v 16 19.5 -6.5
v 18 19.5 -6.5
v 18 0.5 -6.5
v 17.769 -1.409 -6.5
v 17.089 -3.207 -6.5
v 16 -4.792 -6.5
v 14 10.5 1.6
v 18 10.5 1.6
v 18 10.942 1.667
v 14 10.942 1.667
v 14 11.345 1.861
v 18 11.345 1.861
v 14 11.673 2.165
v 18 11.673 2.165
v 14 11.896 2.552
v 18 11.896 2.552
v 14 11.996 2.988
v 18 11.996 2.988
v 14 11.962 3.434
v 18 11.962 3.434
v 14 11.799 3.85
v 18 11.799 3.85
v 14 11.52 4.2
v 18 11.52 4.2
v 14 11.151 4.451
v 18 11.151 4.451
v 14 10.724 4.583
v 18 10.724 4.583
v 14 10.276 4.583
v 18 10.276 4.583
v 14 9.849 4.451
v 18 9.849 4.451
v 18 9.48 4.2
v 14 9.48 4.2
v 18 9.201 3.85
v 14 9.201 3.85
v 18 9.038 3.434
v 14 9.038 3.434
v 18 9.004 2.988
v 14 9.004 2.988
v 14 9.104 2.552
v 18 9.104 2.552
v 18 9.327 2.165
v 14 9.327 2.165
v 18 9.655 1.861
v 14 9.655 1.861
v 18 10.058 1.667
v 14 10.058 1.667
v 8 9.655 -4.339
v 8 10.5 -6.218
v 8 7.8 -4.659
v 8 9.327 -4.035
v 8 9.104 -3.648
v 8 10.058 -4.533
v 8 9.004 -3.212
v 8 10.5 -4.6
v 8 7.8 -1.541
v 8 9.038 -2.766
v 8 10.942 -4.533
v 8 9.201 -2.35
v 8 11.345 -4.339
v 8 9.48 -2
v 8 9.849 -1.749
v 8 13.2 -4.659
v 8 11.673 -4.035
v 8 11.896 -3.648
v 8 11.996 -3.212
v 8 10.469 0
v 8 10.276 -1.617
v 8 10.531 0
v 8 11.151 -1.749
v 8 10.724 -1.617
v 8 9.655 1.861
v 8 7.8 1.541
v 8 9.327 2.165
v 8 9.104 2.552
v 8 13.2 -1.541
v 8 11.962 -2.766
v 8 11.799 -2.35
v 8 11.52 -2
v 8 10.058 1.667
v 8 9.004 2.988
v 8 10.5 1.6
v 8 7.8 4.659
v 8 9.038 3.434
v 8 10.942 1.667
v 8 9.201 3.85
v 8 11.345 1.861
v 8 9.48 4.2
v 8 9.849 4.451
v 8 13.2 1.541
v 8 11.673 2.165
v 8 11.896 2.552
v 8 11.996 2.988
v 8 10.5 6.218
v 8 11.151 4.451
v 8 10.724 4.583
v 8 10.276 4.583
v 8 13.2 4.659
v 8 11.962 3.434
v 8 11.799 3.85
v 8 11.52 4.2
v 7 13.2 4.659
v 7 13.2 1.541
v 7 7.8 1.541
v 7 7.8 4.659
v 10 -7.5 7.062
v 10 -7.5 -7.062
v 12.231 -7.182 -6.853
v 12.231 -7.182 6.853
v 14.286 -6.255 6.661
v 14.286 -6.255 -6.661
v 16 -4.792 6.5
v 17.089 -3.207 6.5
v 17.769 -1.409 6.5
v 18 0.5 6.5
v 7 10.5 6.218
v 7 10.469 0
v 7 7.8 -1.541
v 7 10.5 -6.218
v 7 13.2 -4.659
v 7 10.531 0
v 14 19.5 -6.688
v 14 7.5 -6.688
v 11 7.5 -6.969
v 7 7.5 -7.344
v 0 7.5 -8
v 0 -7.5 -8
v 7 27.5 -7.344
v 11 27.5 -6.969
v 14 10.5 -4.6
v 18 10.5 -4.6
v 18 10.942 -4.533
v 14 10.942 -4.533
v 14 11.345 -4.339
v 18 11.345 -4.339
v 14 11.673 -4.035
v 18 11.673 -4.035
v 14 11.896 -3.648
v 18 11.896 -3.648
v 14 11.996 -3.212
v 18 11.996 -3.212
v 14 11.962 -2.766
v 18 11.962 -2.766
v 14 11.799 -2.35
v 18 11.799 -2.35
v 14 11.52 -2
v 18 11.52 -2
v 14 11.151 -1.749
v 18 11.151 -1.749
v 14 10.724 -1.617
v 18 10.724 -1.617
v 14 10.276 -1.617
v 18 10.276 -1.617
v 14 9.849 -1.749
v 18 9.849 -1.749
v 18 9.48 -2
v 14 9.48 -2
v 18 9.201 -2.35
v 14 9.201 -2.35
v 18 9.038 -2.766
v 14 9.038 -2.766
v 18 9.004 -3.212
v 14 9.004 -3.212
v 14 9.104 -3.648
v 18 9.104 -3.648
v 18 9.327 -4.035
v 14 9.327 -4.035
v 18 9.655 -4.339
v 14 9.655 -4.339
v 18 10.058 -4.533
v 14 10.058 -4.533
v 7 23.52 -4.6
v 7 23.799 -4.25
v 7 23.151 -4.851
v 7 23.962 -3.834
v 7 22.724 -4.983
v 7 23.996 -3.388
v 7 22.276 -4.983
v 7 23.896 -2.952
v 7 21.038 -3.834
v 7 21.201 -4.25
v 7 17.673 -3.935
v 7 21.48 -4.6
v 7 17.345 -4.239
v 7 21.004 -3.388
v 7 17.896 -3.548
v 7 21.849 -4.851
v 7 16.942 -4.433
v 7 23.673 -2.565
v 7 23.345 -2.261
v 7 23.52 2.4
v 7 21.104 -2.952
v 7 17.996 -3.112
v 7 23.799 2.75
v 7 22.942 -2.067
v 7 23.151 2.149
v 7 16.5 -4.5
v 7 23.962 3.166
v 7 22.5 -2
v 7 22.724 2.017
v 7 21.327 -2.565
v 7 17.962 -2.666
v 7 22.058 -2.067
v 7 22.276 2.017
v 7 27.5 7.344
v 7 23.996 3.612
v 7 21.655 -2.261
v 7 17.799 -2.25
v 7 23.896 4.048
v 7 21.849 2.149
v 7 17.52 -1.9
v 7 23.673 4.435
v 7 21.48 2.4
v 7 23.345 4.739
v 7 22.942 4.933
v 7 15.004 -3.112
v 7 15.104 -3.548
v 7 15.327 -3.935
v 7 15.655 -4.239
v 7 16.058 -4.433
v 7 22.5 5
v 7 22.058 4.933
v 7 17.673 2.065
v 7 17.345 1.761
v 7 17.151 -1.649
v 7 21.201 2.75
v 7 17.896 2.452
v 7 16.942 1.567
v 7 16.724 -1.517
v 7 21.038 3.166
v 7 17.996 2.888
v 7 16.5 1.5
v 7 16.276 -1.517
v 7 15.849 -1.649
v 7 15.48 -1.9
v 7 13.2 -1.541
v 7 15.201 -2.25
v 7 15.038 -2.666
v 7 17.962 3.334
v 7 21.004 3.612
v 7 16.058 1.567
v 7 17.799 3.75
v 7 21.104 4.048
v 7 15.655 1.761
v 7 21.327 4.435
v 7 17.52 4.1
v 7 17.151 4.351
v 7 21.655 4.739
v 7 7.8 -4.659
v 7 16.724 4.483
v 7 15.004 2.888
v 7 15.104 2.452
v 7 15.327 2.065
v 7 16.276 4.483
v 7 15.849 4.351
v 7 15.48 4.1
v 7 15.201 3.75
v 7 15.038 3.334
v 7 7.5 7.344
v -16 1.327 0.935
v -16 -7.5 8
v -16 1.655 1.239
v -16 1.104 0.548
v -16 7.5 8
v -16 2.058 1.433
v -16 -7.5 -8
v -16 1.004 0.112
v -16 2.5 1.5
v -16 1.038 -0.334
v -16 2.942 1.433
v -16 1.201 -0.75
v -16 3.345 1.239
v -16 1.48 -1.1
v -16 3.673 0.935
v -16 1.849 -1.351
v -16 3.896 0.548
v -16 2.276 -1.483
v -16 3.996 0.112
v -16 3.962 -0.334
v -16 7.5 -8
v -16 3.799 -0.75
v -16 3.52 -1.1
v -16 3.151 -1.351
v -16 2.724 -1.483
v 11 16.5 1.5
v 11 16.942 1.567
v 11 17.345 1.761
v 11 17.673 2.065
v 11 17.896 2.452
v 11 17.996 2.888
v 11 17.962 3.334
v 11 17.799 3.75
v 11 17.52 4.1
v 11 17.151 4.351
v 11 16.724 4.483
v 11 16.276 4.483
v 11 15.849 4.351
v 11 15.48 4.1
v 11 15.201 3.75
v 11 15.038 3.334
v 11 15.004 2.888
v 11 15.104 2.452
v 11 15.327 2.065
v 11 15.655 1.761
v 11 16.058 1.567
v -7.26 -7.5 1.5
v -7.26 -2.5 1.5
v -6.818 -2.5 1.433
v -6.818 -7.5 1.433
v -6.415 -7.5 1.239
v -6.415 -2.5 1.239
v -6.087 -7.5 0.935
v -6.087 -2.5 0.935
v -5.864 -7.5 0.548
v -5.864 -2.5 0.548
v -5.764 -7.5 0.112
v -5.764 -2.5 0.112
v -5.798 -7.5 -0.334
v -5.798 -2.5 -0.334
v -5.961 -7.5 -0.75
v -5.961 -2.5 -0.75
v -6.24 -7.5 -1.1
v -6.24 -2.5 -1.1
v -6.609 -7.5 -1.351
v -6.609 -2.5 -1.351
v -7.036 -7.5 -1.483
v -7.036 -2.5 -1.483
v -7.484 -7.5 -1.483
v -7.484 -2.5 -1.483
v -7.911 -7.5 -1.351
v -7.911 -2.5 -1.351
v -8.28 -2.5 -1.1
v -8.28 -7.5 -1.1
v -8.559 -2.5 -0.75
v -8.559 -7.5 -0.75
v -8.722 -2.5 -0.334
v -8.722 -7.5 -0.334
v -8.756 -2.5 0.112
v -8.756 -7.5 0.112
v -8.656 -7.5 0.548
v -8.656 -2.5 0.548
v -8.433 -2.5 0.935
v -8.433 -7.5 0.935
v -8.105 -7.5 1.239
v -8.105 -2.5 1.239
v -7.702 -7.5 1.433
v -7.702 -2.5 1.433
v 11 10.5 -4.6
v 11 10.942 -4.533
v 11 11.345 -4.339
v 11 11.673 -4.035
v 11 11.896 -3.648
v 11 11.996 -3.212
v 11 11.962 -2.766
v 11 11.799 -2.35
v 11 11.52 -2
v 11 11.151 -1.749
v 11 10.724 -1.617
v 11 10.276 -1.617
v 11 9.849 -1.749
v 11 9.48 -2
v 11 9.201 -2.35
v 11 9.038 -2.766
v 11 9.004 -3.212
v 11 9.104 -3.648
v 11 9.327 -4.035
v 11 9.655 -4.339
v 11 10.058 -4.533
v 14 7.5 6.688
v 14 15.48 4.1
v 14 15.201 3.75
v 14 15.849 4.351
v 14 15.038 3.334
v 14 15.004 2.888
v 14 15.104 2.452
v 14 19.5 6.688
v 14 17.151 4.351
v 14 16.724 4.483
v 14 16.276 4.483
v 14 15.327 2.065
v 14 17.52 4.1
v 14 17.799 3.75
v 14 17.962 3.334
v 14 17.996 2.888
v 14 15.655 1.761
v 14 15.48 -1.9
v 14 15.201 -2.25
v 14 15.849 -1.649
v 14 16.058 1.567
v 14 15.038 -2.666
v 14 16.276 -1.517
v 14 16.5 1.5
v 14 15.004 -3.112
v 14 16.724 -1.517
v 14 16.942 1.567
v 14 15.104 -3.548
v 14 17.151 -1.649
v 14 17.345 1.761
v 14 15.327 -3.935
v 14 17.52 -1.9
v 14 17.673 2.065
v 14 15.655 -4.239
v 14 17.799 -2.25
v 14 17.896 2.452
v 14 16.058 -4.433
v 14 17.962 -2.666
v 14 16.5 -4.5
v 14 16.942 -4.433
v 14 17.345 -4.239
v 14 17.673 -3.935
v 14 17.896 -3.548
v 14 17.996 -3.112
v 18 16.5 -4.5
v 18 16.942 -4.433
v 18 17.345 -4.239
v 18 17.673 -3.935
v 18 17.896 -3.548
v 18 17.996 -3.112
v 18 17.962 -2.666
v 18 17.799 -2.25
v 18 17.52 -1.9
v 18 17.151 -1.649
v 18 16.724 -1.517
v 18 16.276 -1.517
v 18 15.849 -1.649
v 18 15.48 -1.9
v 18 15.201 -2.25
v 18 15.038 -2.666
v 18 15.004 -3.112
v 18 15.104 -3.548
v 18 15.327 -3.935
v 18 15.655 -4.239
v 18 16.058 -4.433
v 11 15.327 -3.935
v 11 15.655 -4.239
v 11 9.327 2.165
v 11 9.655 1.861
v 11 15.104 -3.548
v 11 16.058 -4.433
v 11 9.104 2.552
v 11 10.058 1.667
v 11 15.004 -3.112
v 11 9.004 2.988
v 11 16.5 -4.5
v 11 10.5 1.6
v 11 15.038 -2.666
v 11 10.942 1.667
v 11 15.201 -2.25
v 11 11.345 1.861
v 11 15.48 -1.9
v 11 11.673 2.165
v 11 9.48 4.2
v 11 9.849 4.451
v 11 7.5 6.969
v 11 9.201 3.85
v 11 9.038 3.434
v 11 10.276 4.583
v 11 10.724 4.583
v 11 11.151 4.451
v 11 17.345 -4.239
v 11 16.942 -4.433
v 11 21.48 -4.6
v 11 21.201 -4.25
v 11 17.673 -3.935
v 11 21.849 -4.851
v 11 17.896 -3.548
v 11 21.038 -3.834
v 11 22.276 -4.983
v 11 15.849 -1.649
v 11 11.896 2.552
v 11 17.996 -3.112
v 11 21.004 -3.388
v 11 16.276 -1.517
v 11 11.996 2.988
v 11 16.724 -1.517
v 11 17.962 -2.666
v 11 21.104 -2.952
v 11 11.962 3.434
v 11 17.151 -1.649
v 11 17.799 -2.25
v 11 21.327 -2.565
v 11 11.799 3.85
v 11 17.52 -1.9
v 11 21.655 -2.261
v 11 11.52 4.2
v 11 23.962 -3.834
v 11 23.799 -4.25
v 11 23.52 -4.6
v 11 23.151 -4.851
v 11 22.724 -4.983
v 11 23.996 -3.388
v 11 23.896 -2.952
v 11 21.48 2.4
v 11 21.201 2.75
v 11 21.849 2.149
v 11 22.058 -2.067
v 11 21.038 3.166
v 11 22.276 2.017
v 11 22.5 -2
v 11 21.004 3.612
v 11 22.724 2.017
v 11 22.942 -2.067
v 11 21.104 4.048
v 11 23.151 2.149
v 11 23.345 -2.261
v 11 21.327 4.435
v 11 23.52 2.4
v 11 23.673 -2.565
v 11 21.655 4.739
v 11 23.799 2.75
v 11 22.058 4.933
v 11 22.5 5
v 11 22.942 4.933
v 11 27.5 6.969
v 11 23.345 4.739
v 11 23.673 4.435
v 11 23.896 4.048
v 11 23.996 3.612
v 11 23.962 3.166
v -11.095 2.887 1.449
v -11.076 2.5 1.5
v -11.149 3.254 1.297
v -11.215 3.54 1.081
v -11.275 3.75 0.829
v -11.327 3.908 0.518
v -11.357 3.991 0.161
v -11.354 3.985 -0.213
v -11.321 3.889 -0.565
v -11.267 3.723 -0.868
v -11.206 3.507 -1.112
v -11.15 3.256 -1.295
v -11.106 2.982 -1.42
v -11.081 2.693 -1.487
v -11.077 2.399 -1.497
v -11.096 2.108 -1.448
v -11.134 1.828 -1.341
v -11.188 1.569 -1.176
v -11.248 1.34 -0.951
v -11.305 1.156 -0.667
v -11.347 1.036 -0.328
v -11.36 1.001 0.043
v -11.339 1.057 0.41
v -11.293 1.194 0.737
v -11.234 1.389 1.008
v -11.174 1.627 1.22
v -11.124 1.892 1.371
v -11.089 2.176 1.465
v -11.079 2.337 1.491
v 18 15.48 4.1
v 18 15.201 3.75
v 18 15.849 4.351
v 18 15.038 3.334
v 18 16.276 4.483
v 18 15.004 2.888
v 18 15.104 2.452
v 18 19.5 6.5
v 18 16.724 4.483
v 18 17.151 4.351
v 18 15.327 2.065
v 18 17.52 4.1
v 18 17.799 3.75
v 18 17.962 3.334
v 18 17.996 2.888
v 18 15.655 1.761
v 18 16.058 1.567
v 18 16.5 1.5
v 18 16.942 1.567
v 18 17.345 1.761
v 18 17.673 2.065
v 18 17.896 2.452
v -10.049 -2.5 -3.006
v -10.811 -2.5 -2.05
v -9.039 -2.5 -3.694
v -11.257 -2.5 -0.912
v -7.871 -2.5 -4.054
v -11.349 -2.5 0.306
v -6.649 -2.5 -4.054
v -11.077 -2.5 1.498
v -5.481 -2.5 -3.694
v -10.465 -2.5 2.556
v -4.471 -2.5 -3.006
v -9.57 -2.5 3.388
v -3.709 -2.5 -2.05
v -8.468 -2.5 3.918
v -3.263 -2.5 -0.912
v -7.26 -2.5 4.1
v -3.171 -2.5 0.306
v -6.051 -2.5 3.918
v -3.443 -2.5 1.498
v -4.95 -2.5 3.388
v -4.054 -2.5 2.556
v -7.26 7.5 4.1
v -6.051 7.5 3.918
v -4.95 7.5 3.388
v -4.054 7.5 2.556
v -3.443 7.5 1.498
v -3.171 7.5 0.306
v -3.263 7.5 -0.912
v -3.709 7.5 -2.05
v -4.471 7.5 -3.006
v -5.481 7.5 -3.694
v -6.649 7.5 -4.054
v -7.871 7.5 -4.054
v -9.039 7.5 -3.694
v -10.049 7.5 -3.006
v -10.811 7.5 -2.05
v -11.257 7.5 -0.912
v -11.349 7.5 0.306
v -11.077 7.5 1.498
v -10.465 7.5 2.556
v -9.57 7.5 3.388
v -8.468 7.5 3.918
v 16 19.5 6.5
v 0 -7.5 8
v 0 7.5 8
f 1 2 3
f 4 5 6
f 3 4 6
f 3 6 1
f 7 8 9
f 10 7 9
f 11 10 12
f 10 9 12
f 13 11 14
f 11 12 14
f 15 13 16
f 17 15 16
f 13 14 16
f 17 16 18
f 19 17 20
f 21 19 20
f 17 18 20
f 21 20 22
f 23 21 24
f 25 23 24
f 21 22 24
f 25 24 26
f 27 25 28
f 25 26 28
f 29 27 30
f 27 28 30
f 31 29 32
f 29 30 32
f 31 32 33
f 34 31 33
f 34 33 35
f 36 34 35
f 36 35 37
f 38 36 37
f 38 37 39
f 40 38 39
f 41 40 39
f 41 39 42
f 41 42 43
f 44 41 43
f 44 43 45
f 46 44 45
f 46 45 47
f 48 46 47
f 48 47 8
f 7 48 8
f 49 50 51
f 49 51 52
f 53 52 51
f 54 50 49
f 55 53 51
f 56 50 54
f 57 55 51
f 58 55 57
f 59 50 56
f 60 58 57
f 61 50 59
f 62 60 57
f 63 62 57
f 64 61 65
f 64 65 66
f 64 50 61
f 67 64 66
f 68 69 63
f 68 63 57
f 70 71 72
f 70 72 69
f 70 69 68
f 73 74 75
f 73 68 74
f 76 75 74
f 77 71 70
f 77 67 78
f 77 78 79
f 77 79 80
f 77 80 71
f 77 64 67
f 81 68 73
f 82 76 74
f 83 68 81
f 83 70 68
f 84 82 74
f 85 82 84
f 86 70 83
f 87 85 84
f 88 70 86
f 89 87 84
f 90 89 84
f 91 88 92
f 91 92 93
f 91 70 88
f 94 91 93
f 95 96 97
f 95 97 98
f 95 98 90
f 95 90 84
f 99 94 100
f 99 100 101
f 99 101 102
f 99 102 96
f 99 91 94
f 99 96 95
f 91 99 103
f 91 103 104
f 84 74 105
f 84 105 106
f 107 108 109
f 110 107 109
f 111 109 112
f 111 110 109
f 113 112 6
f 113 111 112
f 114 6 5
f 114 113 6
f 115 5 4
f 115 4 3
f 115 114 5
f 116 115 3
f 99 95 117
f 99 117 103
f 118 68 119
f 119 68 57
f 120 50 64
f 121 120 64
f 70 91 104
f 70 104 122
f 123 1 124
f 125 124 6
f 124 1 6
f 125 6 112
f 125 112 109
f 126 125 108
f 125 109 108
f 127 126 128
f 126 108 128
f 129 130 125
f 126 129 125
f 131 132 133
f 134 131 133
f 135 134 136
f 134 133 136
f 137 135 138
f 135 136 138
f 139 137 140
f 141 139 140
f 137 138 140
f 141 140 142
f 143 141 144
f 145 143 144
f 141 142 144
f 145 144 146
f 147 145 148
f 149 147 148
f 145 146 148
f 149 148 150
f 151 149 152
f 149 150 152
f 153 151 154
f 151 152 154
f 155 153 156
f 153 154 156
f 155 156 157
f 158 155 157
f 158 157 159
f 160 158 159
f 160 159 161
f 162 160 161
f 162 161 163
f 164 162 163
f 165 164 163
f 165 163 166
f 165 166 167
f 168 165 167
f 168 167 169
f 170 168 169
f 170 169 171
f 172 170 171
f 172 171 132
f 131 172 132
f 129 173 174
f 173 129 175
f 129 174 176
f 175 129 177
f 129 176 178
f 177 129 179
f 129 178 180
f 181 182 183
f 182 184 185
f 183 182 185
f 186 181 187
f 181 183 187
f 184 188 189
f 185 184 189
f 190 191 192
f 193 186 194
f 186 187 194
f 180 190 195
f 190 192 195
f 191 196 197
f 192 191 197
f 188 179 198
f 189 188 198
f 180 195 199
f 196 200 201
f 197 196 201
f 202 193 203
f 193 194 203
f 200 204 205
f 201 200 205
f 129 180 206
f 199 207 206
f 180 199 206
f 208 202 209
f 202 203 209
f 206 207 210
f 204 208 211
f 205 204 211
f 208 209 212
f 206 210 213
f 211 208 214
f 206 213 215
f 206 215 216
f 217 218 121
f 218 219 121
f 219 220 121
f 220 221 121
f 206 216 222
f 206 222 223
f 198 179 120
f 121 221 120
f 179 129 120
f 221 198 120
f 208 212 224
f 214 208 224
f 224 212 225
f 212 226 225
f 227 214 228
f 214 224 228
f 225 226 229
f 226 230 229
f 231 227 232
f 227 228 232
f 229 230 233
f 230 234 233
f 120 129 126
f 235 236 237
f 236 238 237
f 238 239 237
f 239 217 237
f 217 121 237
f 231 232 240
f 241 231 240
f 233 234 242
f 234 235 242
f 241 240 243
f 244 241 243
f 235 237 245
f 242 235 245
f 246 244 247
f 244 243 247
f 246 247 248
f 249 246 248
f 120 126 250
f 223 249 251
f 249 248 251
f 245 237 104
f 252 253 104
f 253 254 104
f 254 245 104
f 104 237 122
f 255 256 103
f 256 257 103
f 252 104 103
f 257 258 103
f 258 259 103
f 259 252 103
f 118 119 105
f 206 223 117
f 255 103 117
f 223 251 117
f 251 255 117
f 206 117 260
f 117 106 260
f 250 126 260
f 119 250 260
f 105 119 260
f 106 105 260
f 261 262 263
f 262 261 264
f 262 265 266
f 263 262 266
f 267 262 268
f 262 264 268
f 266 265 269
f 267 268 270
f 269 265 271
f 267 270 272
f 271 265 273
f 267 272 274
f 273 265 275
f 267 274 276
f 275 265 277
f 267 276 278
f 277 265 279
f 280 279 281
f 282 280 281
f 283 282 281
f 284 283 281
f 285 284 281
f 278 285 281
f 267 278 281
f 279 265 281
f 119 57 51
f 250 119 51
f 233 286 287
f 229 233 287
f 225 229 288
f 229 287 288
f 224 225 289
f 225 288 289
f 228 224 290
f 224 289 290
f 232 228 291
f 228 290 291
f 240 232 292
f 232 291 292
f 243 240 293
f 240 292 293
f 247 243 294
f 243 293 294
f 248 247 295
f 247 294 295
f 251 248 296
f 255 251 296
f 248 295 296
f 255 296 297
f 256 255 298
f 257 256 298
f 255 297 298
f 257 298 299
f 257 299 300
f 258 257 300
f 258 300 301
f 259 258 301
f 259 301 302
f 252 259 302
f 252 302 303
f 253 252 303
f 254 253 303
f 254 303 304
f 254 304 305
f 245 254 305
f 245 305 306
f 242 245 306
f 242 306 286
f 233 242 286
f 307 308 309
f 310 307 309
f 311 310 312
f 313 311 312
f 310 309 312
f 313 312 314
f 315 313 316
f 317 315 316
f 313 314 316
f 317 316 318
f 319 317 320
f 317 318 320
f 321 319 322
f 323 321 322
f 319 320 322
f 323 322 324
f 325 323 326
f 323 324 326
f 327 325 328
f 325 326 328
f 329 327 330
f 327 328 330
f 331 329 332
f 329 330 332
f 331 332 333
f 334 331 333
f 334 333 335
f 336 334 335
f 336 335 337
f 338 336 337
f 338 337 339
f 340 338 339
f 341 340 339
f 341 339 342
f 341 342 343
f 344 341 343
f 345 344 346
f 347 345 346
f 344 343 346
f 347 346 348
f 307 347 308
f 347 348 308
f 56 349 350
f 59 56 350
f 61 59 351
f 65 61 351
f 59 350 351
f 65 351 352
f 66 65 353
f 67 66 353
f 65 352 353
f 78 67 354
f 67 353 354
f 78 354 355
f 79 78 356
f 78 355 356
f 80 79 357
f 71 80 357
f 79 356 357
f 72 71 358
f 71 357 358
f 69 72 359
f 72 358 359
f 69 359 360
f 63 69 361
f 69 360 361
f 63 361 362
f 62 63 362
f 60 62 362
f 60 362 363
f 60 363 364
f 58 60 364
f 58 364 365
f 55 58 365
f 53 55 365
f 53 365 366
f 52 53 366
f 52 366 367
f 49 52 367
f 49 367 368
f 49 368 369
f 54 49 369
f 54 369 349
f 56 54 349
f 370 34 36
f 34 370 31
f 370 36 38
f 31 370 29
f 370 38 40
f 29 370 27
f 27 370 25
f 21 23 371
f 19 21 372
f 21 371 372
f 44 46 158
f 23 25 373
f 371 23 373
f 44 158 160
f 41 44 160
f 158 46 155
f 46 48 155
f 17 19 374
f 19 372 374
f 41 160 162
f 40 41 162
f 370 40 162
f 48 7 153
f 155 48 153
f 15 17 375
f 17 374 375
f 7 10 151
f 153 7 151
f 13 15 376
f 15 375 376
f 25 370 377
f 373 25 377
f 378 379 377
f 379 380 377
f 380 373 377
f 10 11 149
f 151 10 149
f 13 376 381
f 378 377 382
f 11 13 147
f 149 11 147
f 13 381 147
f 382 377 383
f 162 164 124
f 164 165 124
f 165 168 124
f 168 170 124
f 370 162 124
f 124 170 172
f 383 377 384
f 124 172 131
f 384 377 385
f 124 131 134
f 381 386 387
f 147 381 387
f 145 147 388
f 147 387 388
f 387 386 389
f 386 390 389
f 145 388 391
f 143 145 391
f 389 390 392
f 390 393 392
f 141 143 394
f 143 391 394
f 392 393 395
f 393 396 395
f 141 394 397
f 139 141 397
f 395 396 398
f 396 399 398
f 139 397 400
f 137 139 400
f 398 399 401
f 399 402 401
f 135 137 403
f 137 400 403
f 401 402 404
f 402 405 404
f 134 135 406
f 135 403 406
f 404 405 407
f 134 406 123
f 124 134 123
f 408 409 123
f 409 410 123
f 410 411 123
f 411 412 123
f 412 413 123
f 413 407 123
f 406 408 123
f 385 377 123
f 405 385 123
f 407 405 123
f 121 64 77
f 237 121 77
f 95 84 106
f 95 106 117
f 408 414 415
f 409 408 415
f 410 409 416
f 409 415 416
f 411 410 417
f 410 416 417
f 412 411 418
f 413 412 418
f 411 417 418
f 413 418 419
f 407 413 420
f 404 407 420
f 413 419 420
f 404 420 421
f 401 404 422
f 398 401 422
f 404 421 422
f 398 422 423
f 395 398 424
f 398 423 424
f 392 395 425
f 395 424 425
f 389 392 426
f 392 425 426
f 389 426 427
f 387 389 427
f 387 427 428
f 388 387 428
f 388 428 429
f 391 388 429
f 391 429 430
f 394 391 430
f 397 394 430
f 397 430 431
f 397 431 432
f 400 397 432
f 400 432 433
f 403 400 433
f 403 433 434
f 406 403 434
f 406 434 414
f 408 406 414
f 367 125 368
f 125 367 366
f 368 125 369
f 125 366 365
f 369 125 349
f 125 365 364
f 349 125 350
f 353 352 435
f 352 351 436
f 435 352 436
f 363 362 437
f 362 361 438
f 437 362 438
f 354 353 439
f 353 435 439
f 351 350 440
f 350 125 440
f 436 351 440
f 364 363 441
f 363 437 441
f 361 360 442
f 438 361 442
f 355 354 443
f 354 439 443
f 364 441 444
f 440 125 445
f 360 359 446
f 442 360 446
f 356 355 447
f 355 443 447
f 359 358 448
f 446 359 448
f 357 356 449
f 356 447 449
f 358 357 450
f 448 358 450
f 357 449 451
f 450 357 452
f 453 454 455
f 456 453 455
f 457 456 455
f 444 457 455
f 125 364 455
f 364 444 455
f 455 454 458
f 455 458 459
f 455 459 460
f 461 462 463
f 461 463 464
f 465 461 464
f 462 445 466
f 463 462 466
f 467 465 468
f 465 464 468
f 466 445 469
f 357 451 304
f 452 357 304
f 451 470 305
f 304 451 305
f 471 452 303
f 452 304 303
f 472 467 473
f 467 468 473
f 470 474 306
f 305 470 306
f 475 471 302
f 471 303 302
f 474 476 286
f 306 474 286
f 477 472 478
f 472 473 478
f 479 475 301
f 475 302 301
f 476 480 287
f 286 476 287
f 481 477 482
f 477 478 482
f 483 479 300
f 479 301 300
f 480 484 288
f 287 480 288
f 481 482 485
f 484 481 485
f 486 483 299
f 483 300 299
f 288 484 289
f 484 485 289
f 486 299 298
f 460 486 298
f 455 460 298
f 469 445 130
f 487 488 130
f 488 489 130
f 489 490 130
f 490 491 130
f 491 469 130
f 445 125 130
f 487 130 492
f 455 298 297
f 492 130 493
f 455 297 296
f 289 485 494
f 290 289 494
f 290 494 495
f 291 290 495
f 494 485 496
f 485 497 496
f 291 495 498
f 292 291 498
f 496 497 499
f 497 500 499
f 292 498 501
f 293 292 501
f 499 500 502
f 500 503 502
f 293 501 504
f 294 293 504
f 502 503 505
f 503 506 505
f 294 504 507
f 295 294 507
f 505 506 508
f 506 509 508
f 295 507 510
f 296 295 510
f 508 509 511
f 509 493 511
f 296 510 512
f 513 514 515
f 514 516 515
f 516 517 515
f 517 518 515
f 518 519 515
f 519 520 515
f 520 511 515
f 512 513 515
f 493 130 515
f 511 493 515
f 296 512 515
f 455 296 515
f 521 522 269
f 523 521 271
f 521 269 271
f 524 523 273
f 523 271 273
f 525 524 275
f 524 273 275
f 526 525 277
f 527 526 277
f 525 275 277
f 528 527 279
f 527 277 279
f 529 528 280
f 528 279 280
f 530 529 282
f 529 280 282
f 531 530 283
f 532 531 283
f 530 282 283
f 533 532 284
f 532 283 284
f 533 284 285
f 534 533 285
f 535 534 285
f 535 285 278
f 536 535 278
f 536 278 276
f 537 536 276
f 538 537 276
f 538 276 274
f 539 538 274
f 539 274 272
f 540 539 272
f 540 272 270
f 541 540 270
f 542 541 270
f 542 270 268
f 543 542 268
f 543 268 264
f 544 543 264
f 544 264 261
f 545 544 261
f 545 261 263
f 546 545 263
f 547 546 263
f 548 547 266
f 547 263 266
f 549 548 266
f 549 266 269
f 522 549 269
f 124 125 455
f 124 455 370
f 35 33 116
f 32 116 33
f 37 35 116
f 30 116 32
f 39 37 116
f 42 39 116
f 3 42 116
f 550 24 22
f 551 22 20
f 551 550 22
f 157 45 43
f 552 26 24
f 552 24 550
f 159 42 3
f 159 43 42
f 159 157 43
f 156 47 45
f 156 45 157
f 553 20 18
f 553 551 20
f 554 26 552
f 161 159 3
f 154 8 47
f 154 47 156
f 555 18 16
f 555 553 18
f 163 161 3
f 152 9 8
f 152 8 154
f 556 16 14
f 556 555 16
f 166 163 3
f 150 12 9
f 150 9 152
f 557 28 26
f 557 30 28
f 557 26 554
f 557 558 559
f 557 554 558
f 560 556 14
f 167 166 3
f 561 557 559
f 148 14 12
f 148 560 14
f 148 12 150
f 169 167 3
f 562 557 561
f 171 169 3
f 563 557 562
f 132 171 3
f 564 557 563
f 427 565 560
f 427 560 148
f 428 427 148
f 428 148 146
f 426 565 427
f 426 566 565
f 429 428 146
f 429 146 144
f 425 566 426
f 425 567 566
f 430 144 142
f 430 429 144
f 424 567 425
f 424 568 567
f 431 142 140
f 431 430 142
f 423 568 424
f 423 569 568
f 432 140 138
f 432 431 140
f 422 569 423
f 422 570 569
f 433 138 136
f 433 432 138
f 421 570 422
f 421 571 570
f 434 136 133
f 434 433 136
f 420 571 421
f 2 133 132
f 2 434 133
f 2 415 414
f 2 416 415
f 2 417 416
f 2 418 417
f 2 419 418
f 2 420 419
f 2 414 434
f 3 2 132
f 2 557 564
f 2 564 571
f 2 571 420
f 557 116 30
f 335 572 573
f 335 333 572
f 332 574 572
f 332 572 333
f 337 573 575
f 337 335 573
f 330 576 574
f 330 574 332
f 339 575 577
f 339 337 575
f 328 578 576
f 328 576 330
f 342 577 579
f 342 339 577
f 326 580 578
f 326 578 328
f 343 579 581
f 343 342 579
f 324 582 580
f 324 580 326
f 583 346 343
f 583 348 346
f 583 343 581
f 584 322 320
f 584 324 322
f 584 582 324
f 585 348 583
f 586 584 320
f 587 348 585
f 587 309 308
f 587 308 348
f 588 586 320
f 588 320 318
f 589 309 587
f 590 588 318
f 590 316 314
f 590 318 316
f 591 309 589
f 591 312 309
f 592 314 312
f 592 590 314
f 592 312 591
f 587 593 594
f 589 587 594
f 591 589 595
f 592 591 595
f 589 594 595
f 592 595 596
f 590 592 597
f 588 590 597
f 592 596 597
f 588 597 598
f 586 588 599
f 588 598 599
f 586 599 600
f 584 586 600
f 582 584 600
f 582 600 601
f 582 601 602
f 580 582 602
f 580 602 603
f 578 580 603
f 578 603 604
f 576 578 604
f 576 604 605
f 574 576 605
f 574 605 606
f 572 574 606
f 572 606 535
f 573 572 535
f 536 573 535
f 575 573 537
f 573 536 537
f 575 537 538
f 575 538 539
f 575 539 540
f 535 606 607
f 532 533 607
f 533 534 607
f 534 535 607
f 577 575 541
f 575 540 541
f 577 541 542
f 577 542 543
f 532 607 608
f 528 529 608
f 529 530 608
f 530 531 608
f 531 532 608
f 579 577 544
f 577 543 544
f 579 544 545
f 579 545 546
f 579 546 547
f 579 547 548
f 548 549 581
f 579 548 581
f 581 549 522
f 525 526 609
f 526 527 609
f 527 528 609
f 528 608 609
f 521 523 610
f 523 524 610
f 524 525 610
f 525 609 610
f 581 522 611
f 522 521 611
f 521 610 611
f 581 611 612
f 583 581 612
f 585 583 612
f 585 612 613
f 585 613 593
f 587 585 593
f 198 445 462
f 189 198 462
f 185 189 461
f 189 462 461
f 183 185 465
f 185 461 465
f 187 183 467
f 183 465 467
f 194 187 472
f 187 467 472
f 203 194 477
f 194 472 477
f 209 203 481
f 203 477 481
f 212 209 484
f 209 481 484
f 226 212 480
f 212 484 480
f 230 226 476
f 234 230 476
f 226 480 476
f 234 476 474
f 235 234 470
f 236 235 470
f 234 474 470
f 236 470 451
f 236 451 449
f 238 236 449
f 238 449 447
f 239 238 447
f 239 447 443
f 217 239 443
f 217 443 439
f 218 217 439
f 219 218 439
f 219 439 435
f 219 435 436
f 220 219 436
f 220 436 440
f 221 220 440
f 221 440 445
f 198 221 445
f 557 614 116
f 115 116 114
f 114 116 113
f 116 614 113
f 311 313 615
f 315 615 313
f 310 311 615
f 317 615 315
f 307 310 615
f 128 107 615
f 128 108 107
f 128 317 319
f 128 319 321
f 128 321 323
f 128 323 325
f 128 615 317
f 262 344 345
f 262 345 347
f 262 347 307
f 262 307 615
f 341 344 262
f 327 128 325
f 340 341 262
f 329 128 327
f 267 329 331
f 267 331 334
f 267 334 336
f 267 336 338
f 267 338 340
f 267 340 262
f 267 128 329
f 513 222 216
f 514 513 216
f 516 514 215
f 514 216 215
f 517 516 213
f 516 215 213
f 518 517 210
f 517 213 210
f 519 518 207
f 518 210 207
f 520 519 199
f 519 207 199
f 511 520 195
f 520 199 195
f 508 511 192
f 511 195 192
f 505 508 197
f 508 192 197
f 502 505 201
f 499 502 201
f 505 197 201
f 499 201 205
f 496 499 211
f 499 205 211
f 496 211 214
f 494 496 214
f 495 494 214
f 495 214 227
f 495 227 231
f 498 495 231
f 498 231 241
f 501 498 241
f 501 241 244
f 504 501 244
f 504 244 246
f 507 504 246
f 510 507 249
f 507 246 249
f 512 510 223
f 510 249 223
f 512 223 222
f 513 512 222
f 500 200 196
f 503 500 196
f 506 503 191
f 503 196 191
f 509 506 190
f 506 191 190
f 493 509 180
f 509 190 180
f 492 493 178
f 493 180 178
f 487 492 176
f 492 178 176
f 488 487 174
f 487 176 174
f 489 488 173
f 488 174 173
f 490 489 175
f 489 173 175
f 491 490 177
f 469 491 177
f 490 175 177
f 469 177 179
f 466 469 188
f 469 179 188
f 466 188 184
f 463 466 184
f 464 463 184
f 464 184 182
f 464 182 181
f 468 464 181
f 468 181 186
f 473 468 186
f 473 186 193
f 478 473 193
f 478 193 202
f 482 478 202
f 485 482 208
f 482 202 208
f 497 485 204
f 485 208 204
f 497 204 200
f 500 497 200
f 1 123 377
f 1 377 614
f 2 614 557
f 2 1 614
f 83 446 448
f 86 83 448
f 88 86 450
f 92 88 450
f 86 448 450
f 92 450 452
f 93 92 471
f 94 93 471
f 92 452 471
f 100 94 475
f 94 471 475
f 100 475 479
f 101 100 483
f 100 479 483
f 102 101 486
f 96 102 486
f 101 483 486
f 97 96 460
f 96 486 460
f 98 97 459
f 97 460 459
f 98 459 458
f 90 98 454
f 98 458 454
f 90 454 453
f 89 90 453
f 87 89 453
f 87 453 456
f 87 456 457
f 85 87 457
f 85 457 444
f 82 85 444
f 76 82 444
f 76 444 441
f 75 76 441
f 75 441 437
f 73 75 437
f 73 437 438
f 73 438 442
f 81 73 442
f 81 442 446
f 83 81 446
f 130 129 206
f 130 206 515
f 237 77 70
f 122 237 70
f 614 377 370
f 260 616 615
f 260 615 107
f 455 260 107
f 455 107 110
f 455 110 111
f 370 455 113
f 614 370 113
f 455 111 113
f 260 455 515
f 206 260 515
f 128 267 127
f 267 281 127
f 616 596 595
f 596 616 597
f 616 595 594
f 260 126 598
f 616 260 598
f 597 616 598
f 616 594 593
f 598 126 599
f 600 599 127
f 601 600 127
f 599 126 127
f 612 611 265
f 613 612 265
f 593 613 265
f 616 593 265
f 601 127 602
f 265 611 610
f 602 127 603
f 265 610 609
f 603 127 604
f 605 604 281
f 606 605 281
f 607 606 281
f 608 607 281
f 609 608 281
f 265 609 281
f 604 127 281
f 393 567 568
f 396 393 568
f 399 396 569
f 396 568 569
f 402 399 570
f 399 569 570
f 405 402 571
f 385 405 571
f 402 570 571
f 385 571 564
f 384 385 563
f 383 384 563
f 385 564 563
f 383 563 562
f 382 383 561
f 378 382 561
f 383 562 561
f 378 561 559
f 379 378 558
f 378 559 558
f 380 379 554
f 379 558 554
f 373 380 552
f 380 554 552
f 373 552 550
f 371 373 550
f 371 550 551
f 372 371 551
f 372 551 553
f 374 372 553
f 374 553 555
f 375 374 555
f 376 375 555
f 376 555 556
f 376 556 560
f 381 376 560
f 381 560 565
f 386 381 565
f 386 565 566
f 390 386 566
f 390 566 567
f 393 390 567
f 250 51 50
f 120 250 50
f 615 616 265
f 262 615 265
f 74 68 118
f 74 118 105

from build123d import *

# Parameters (mm, degrees)
BOSS_EXTRUDE1_DEPTH     = 7.5
SKETCH4_R               = 4.1
CUT_EXTRUDE1_DEPTH      = 10
SKETCH5_R               = 1.5
CUT_EXTRUDE2_DEPTH      = 5
CUT_EXTRUDE4_REACH      = 40.591
CUT_EXTRUDE4_END_RADIUS = 4.1
SKETCH7_R               = 1.5
BOSS_EXTRUDE2_DEPTH     = 20
CUT_EXTRUDE5_DEPTH      = 20
CUT_EXTRUDE6_DEPTH      = 8
SKETCH13_R              = 1.5
CUT_EXTRUDE7_DEPTH      = 16
SKETCH14_R              = 1.5
CUT_EXTRUDE8_DEPTH      = 4
CUT_EXTRUDE9_START      = -1
CUT_EXTRUDE9_DEPTH      = 2.6
SKETCH16_W              = 3
SKETCH16_H              = 13
CUT_EXTRUDE10_DEPTH     = 36.128336141
FILLET1_R               = 8


with BuildPart() as part:
    # Sketch2 → Boss-Extrude1 (new, symmetric)
    with BuildSketch(Plane(origin=(0, 0, 0), x_dir=(1, 0, 0), z_dir=(0, 1, 0))):
        Polygon((-16, -8), (-16, 8), (0, 8), (16, 6.5), (21, 6.5), (21, -6.5), (16, -6.5), (0, -8), align=None)
    extrude(amount=BOSS_EXTRUDE1_DEPTH, both=True)

    # Sketch4 → Cut-Extrude1 (cut)
    with BuildSketch(Plane(origin=(0, 7.5, 0), x_dir=(1, 0, 0), z_dir=(0, 1, 0))):
        with Locations(Location((-7.259972257, 0, 0), (0, 0, 270))):
            Circle(SKETCH4_R)
    extrude(amount=-CUT_EXTRUDE1_DEPTH, mode=Mode.SUBTRACT)

    # Sketch5 → Cut-Extrude2 (cut)
    with BuildSketch(Plane(origin=(0, -2.5, 0), x_dir=(1, 0, 0), z_dir=(0, 1, 0))):
        with Locations(Location((-7.259972257, 0, 0), (0, 0, 270))):
            Circle(SKETCH5_R)
    extrude(amount=-CUT_EXTRUDE2_DEPTH, mode=Mode.SUBTRACT)

    # Cut-Extrude4: up to this cylinder (the profile starts outside it)
    cut_extrude4_end = Plane(origin=(-7.259972257, 2.5, 0), z_dir=(0, 1, 0)) * Cylinder(CUT_EXTRUDE4_END_RADIUS, 90.382, mode=Mode.PRIVATE)
    # Sketch7 → Cut-Extrude4 (cut, up to the surface)
    with BuildSketch(Plane.ZY.offset(16), mode=Mode.PRIVATE) as cut_extrude4_sk1:
        with Locations((0, 2.5)):
            Circle(SKETCH7_R)
    cut_extrude4_tool1 = extrude(cut_extrude4_sk1.sketch, amount=-CUT_EXTRUDE4_REACH, mode=Mode.PRIVATE) - cut_extrude4_end
    add(cut_extrude4_tool1.solids().sort_by_distance((-16, 2.5, 0))[0], mode=Mode.SUBTRACT)

    # Sketch8 → Boss-Extrude2 (add)
    with BuildSketch(Plane(origin=(0, 7.5, 0), x_dir=(1, 0, 0), z_dir=(0, 1, 0))):
        Polygon((7, 7.34375), (7, -7.34375), (16, -6.5), (21, -6.5), (21, 6.5), (16, 6.5), align=None)
    extrude(amount=BOSS_EXTRUDE2_DEPTH)

    # Sketch11 → Cut-Extrude5 (cut)
    with BuildSketch(Plane(origin=(0, 27.5, 0), x_dir=(1, 0, 0), z_dir=(0, 1, 0))):
        Polygon((11, 6.96875), (11, -6.96875), (14, -6.6875), (14, 6.6875), align=None)
    extrude(amount=-CUT_EXTRUDE5_DEPTH, mode=Mode.SUBTRACT)

    # Sketch12 → Cut-Extrude6 (cut)
    with BuildSketch(Plane(origin=(0, 27.5, 0), x_dir=(1, 0, 0), z_dir=(0, 1, 0))):
        Polygon((14, 6.6875), (14, -6.6875), (16, -6.5), (21, -6.5), (21, 6.5), (16, 6.5), align=None)
    extrude(amount=-CUT_EXTRUDE6_DEPTH, mode=Mode.SUBTRACT)

    # Sketch13 → Cut-Extrude7 (cut)
    with BuildSketch(Plane(origin=(21, 0, 0), x_dir=(0, 0, -1), z_dir=(1, 0, 0))):
        with Locations((-3, 16.5)):
            Circle(SKETCH13_R)
        with Locations((3, 16.5)):
            Circle(SKETCH13_R)
        with Locations((-3.1, 10.5)):
            Circle(SKETCH13_R)
        with Locations((3.1, 10.5)):
            Circle(SKETCH13_R)
    extrude(amount=-CUT_EXTRUDE7_DEPTH, mode=Mode.SUBTRACT)

    # Sketch14 → Cut-Extrude8 (cut)
    with BuildSketch(Plane.ZY.offset(-7)):
        with Locations((-3.5, 22.5)):
            Circle(SKETCH14_R)
        with Locations((3.5, 22.5)):
            Circle(SKETCH14_R)
    extrude(amount=-CUT_EXTRUDE8_DEPTH, mode=Mode.SUBTRACT)

    # Sketch15 → Cut-Extrude9 (cut)
    with BuildSketch(Plane.ZY.offset(-7).offset(CUT_EXTRUDE9_START)):
        Polygon((4.658845727, 13.2), (1.541154273, 13.2), (-0.017691454, 10.5), (1.541154273, 7.8), (4.658845727, 7.8), (6.217691454, 10.5), align=None)
    cut_extrude9 = extrude(amount=CUT_EXTRUDE9_DEPTH, mode=Mode.SUBTRACT)

    # Mirror1: Cut-Extrude9 across plane
    add(cut_extrude9.mirror(Plane.XY), mode=Mode.SUBTRACT)

    # Sketch16 → Cut-Extrude10 (cut, through all)
    with BuildSketch(Plane(origin=(0, 19.5, 0), x_dir=(1, 0, 0), z_dir=(0, 1, 0))):
        with Locations((19.5, 0)):
            Rectangle(SKETCH16_W, SKETCH16_H)
    extrude(amount=-CUT_EXTRUDE10_DEPTH, mode=Mode.SUBTRACT)

    # Fillet1
    fillet1_edges = [part.edges().sort_by_distance(p)[0] for p in [
        (18, -7.5, 0),
    ]]
    fillet(fillet1_edges, radius=FILLET1_R)


solid = part.part
